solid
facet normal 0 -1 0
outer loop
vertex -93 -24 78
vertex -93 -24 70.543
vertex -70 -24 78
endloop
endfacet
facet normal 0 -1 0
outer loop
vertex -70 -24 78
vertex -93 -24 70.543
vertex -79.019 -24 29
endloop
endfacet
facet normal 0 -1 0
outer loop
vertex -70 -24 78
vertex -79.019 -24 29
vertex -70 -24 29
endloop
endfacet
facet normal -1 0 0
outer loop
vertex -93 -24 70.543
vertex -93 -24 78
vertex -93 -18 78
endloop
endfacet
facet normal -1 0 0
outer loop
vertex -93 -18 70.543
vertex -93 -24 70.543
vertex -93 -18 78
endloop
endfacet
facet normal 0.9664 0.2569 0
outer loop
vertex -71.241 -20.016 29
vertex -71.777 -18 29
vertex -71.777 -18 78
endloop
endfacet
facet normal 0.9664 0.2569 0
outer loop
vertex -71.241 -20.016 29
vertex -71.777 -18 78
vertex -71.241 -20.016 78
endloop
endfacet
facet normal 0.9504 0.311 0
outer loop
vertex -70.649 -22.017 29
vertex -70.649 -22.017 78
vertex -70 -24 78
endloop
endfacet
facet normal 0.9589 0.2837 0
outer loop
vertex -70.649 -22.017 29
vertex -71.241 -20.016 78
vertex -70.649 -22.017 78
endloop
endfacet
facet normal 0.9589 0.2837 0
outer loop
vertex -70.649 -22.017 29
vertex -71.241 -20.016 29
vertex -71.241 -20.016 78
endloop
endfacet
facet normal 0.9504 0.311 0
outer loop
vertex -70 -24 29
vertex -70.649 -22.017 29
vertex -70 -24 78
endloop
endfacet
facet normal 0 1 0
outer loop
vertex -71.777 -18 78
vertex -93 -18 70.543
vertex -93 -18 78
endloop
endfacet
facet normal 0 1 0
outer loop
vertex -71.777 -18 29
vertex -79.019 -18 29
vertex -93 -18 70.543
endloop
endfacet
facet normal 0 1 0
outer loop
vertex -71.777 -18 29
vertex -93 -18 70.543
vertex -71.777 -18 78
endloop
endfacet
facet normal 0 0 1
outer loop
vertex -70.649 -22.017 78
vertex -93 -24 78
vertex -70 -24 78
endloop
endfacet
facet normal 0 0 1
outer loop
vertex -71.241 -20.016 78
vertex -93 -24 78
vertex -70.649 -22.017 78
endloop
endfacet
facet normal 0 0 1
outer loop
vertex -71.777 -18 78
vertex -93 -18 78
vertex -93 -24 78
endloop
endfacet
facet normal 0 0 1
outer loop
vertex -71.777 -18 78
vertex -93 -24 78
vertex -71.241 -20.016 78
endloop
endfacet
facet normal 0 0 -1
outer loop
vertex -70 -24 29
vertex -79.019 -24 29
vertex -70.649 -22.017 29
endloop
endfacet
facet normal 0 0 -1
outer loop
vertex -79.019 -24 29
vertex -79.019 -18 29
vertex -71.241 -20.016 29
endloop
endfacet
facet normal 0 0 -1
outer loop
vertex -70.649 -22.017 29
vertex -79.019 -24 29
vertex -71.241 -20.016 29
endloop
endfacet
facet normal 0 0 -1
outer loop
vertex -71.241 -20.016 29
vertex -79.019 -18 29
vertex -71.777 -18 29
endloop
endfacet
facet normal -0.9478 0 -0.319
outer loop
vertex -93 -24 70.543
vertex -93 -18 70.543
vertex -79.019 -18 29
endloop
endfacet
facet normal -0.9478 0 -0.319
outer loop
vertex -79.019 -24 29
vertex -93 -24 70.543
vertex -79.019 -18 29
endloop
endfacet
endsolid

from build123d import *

# Parameters (mm, degrees)
CYLINDER1792_R         = 74
CYLINDER1792_DEPTH     = 60
BOX754_W               = 80
BOX754_H               = 6
BOX754_DEPTH           = 20
BOX754_PLACEMENT_ANGLE = 71.4
BOX752_W               = 44
BOX752_H               = 6
BOX752_DEPTH           = 49


with BuildPart() as v_lec1792:
    # Cylinder1792 → Cylinder1792 (new body)
    with BuildSketch(Plane.XY.offset(26)):
        Circle(CYLINDER1792_R)
    extrude(amount=CYLINDER1792_DEPTH)


with BuildPart() as krychle754:
    # Box754 → Box754 (new body)
    with BuildSketch(Plane.XY):
        with Locations((40, 3)):
            Rectangle(BOX754_W, BOX754_H)
    extrude(amount=BOX754_DEPTH)


with BuildPart() as krychle754_1:
    # Box754 placement: moved
    add(krychle754.part.moved(Location((-118.17, -24, 82.63))).rotate(Axis((-118.17, -24, 82.63), (0, 1, 0)), BOX754_PLACEMENT_ANGLE))


with BuildPart() as cut555:
    # Box752 → Box752 (new body)
    with BuildSketch(Plane(origin=(-93, -24, 29), x_dir=(1, 0, 0), z_dir=(0, 0, 1))):
        with Locations((22, 3)):
            Rectangle(BOX752_W, BOX752_H)
    extrude(amount=BOX752_DEPTH)

    # Cut548: cut Krychle754
    add(krychle754_1.part, mode=Mode.SUBTRACT)

    # Cut555: cut Válec1792
    add(v_lec1792.part, mode=Mode.SUBTRACT)


solid = cut555.part
